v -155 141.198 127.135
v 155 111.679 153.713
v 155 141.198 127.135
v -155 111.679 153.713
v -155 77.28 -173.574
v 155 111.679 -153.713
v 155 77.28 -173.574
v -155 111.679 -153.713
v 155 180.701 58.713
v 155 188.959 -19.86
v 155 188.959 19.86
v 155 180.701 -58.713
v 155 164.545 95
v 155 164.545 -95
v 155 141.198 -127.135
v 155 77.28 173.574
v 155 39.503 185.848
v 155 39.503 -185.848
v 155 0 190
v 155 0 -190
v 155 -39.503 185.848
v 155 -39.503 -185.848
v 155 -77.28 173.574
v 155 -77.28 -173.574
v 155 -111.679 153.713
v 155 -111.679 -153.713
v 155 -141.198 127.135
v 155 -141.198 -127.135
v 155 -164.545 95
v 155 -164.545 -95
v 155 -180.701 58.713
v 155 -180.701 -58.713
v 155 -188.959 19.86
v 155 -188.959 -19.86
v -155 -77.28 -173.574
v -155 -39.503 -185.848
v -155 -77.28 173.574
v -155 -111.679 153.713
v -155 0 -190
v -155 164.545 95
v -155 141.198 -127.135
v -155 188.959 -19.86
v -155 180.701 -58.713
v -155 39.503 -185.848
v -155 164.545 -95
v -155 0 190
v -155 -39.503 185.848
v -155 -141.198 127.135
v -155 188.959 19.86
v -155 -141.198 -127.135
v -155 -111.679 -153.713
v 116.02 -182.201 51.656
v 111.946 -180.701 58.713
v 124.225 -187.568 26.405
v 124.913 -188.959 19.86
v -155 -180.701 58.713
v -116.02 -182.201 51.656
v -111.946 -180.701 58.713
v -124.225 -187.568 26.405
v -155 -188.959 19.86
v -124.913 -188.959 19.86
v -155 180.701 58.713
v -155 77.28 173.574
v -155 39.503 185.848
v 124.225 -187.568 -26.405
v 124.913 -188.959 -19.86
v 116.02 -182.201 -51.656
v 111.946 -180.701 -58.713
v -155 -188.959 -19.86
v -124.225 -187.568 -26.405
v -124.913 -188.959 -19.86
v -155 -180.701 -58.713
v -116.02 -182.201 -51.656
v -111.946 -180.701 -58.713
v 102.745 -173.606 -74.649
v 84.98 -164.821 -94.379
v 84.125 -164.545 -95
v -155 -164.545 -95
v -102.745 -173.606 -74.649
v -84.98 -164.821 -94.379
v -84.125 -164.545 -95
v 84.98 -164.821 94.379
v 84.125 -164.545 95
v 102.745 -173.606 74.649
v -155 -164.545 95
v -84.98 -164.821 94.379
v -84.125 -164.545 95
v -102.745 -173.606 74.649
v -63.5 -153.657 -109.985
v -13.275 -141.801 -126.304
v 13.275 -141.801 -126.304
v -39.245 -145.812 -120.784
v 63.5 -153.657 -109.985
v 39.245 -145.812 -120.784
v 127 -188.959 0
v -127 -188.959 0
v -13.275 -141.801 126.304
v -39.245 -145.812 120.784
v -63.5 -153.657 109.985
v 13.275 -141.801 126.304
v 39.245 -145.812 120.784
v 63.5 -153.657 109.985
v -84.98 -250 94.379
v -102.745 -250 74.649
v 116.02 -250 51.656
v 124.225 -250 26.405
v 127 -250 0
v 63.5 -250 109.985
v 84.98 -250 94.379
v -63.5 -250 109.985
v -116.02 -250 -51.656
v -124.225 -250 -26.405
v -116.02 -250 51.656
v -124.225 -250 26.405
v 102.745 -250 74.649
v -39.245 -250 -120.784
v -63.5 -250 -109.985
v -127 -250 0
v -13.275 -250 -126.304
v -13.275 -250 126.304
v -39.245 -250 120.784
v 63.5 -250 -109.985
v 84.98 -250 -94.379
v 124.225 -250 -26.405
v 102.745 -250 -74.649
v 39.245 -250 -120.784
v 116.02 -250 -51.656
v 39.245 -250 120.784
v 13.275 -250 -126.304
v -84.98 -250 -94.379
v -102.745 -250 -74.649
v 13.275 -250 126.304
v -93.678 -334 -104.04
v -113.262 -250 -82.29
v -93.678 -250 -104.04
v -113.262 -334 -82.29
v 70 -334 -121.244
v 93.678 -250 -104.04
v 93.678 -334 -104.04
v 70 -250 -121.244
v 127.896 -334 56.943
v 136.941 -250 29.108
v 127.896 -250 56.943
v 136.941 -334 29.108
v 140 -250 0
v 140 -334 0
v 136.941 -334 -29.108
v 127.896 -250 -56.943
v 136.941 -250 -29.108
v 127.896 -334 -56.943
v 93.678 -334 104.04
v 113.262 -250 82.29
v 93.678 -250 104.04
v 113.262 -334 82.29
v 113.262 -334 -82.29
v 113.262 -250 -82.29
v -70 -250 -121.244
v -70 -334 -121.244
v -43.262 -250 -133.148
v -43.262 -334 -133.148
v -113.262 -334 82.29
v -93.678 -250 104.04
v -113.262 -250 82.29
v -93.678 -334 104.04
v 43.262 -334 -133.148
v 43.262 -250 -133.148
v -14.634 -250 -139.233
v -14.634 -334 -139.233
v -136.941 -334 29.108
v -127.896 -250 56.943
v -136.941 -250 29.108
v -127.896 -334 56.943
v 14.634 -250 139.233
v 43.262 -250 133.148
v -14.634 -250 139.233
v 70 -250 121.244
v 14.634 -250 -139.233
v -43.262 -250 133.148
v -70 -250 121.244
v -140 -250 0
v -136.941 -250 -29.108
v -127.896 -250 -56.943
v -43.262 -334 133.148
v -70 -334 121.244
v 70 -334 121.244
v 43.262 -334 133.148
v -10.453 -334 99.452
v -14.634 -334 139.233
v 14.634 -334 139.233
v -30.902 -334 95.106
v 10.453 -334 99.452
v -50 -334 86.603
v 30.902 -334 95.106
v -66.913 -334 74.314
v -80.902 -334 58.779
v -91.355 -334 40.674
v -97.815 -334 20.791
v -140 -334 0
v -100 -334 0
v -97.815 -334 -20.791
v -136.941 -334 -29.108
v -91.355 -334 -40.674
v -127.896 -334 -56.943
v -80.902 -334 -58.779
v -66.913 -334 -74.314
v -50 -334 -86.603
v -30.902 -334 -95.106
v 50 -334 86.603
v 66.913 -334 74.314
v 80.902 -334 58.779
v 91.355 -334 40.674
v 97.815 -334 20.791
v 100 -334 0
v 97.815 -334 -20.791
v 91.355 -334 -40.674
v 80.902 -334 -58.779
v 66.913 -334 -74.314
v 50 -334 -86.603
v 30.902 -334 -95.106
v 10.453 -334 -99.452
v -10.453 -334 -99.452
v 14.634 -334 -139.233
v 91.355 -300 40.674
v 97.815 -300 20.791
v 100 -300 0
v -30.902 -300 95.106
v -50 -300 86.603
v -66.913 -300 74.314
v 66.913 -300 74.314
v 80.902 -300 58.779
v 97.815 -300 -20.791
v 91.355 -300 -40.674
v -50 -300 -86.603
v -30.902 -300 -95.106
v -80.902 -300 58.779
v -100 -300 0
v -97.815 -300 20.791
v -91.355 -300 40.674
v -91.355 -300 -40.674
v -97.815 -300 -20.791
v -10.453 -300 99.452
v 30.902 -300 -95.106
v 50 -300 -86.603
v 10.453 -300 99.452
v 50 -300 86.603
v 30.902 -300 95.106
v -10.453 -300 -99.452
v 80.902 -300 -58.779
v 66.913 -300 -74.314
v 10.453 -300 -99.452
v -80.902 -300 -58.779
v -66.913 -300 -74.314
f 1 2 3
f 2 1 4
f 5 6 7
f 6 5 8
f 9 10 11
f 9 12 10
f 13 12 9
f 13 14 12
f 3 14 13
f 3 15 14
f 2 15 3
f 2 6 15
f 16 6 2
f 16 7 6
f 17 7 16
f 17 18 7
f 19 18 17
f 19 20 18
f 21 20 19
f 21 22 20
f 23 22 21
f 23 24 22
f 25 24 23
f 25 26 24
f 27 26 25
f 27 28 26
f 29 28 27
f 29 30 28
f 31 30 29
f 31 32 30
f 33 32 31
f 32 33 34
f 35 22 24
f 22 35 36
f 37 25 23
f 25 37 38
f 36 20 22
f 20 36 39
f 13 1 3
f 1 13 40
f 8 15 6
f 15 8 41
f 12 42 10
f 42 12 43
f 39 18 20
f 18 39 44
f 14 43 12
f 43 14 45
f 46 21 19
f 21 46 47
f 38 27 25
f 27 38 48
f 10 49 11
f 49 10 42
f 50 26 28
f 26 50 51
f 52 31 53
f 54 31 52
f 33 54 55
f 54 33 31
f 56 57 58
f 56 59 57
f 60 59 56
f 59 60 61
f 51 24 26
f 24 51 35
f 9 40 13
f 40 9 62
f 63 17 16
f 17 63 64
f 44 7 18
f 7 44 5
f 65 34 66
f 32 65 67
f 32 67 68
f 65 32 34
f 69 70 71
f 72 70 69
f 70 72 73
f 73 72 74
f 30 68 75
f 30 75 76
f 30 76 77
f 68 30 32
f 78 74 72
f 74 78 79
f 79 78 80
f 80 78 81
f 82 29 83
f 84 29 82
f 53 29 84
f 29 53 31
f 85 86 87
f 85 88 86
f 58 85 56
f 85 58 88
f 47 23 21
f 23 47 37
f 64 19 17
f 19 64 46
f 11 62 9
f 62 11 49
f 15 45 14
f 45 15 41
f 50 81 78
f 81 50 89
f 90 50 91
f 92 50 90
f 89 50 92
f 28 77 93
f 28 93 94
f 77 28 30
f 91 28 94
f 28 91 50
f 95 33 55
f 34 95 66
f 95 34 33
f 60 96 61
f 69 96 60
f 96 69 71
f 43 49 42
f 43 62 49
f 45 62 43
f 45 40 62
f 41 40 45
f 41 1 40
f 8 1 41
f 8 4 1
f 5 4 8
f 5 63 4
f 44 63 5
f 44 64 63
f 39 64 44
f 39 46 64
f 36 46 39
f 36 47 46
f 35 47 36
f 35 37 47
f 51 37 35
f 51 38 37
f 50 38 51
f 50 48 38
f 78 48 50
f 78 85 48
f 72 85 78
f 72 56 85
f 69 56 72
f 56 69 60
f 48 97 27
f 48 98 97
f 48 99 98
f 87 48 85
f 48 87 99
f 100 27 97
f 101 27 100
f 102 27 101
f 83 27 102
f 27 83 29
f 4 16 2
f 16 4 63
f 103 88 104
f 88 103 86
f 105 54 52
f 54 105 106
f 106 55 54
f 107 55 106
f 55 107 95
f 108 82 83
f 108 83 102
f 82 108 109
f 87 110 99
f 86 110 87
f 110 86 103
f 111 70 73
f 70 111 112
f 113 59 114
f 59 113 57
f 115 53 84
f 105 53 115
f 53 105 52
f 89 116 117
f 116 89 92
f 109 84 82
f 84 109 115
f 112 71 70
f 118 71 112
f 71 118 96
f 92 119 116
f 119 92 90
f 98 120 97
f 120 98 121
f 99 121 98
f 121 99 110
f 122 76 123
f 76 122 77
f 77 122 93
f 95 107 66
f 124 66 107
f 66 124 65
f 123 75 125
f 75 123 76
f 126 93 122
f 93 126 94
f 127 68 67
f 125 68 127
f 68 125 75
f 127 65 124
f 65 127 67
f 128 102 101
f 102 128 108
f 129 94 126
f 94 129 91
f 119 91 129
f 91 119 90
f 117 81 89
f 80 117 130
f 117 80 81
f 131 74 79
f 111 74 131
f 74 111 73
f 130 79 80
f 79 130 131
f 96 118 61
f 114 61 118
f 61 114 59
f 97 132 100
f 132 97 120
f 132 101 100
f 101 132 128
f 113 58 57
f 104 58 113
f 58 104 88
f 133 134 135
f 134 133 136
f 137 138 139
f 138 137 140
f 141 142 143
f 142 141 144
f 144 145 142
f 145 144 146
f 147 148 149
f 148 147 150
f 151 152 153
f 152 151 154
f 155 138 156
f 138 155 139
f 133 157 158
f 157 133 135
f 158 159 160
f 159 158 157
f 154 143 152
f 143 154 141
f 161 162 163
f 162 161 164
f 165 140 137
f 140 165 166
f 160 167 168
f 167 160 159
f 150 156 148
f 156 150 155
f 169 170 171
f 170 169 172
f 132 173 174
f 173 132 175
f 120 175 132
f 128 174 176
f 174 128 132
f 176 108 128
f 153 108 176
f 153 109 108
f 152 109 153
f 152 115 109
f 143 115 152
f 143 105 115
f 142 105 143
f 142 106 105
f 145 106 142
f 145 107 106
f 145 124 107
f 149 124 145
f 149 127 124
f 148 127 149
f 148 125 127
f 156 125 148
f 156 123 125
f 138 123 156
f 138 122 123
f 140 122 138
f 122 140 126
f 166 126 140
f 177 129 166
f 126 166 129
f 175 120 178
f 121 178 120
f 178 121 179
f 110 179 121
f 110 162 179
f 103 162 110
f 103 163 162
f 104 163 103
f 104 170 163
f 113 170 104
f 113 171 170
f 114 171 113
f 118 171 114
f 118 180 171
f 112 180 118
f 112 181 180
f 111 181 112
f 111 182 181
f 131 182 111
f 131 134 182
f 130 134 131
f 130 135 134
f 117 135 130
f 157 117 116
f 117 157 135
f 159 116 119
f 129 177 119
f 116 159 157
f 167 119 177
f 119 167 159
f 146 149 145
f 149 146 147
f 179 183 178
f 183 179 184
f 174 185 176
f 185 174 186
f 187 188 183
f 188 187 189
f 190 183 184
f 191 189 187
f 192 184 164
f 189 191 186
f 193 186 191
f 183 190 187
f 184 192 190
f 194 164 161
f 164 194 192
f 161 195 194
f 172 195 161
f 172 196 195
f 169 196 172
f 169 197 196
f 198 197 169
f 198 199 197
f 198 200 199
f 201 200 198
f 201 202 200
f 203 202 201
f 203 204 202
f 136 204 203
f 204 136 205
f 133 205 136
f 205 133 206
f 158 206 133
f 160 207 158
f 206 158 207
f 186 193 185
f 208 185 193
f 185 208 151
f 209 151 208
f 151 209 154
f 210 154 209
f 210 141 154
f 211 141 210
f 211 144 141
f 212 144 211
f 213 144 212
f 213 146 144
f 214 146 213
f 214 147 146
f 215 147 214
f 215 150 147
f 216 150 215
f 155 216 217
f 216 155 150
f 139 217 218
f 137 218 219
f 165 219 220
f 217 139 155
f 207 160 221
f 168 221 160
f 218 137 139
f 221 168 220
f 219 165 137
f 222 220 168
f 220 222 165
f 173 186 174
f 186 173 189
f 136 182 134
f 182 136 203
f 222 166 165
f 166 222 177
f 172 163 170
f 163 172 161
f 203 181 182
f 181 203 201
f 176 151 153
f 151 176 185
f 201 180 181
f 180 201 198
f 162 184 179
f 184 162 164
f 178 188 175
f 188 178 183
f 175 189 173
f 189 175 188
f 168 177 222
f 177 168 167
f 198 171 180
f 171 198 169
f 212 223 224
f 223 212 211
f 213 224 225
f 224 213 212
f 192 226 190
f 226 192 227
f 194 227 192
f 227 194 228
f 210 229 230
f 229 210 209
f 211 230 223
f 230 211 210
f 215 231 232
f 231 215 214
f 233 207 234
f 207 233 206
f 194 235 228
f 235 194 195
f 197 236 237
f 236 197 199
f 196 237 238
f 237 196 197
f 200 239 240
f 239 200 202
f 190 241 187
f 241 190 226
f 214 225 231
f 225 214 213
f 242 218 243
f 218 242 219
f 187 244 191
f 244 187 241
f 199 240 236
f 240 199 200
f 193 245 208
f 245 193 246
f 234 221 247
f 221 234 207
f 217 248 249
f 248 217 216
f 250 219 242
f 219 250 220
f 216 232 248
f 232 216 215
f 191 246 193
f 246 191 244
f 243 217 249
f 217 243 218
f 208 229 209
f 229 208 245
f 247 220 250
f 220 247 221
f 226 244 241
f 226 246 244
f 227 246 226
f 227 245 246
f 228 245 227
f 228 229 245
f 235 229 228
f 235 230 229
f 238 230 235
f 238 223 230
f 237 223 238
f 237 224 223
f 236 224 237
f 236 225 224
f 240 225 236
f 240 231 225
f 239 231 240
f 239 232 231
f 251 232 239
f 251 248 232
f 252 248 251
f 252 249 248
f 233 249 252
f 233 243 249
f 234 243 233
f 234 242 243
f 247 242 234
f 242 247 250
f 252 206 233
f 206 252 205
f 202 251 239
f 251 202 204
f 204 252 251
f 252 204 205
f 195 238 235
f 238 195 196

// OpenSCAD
// Efector Final del robot

difference()
{
	union()
	{
		rotate([0,90,0])cylinder(h=310 ,r1=190, r2=190, center=true);
		rotate([90,0,0])cylinder(h=300 ,r1=127, r2=127, center=false);
		translate([0,-250,0])rotate([90,0,0])cylinder(h=84 ,r1=140, r2=140, center=false);
	}
	translate([0,-300,0])rotate([90,0,0])cylinder(h=300 ,r1=100, r2=100, center=false);
}
